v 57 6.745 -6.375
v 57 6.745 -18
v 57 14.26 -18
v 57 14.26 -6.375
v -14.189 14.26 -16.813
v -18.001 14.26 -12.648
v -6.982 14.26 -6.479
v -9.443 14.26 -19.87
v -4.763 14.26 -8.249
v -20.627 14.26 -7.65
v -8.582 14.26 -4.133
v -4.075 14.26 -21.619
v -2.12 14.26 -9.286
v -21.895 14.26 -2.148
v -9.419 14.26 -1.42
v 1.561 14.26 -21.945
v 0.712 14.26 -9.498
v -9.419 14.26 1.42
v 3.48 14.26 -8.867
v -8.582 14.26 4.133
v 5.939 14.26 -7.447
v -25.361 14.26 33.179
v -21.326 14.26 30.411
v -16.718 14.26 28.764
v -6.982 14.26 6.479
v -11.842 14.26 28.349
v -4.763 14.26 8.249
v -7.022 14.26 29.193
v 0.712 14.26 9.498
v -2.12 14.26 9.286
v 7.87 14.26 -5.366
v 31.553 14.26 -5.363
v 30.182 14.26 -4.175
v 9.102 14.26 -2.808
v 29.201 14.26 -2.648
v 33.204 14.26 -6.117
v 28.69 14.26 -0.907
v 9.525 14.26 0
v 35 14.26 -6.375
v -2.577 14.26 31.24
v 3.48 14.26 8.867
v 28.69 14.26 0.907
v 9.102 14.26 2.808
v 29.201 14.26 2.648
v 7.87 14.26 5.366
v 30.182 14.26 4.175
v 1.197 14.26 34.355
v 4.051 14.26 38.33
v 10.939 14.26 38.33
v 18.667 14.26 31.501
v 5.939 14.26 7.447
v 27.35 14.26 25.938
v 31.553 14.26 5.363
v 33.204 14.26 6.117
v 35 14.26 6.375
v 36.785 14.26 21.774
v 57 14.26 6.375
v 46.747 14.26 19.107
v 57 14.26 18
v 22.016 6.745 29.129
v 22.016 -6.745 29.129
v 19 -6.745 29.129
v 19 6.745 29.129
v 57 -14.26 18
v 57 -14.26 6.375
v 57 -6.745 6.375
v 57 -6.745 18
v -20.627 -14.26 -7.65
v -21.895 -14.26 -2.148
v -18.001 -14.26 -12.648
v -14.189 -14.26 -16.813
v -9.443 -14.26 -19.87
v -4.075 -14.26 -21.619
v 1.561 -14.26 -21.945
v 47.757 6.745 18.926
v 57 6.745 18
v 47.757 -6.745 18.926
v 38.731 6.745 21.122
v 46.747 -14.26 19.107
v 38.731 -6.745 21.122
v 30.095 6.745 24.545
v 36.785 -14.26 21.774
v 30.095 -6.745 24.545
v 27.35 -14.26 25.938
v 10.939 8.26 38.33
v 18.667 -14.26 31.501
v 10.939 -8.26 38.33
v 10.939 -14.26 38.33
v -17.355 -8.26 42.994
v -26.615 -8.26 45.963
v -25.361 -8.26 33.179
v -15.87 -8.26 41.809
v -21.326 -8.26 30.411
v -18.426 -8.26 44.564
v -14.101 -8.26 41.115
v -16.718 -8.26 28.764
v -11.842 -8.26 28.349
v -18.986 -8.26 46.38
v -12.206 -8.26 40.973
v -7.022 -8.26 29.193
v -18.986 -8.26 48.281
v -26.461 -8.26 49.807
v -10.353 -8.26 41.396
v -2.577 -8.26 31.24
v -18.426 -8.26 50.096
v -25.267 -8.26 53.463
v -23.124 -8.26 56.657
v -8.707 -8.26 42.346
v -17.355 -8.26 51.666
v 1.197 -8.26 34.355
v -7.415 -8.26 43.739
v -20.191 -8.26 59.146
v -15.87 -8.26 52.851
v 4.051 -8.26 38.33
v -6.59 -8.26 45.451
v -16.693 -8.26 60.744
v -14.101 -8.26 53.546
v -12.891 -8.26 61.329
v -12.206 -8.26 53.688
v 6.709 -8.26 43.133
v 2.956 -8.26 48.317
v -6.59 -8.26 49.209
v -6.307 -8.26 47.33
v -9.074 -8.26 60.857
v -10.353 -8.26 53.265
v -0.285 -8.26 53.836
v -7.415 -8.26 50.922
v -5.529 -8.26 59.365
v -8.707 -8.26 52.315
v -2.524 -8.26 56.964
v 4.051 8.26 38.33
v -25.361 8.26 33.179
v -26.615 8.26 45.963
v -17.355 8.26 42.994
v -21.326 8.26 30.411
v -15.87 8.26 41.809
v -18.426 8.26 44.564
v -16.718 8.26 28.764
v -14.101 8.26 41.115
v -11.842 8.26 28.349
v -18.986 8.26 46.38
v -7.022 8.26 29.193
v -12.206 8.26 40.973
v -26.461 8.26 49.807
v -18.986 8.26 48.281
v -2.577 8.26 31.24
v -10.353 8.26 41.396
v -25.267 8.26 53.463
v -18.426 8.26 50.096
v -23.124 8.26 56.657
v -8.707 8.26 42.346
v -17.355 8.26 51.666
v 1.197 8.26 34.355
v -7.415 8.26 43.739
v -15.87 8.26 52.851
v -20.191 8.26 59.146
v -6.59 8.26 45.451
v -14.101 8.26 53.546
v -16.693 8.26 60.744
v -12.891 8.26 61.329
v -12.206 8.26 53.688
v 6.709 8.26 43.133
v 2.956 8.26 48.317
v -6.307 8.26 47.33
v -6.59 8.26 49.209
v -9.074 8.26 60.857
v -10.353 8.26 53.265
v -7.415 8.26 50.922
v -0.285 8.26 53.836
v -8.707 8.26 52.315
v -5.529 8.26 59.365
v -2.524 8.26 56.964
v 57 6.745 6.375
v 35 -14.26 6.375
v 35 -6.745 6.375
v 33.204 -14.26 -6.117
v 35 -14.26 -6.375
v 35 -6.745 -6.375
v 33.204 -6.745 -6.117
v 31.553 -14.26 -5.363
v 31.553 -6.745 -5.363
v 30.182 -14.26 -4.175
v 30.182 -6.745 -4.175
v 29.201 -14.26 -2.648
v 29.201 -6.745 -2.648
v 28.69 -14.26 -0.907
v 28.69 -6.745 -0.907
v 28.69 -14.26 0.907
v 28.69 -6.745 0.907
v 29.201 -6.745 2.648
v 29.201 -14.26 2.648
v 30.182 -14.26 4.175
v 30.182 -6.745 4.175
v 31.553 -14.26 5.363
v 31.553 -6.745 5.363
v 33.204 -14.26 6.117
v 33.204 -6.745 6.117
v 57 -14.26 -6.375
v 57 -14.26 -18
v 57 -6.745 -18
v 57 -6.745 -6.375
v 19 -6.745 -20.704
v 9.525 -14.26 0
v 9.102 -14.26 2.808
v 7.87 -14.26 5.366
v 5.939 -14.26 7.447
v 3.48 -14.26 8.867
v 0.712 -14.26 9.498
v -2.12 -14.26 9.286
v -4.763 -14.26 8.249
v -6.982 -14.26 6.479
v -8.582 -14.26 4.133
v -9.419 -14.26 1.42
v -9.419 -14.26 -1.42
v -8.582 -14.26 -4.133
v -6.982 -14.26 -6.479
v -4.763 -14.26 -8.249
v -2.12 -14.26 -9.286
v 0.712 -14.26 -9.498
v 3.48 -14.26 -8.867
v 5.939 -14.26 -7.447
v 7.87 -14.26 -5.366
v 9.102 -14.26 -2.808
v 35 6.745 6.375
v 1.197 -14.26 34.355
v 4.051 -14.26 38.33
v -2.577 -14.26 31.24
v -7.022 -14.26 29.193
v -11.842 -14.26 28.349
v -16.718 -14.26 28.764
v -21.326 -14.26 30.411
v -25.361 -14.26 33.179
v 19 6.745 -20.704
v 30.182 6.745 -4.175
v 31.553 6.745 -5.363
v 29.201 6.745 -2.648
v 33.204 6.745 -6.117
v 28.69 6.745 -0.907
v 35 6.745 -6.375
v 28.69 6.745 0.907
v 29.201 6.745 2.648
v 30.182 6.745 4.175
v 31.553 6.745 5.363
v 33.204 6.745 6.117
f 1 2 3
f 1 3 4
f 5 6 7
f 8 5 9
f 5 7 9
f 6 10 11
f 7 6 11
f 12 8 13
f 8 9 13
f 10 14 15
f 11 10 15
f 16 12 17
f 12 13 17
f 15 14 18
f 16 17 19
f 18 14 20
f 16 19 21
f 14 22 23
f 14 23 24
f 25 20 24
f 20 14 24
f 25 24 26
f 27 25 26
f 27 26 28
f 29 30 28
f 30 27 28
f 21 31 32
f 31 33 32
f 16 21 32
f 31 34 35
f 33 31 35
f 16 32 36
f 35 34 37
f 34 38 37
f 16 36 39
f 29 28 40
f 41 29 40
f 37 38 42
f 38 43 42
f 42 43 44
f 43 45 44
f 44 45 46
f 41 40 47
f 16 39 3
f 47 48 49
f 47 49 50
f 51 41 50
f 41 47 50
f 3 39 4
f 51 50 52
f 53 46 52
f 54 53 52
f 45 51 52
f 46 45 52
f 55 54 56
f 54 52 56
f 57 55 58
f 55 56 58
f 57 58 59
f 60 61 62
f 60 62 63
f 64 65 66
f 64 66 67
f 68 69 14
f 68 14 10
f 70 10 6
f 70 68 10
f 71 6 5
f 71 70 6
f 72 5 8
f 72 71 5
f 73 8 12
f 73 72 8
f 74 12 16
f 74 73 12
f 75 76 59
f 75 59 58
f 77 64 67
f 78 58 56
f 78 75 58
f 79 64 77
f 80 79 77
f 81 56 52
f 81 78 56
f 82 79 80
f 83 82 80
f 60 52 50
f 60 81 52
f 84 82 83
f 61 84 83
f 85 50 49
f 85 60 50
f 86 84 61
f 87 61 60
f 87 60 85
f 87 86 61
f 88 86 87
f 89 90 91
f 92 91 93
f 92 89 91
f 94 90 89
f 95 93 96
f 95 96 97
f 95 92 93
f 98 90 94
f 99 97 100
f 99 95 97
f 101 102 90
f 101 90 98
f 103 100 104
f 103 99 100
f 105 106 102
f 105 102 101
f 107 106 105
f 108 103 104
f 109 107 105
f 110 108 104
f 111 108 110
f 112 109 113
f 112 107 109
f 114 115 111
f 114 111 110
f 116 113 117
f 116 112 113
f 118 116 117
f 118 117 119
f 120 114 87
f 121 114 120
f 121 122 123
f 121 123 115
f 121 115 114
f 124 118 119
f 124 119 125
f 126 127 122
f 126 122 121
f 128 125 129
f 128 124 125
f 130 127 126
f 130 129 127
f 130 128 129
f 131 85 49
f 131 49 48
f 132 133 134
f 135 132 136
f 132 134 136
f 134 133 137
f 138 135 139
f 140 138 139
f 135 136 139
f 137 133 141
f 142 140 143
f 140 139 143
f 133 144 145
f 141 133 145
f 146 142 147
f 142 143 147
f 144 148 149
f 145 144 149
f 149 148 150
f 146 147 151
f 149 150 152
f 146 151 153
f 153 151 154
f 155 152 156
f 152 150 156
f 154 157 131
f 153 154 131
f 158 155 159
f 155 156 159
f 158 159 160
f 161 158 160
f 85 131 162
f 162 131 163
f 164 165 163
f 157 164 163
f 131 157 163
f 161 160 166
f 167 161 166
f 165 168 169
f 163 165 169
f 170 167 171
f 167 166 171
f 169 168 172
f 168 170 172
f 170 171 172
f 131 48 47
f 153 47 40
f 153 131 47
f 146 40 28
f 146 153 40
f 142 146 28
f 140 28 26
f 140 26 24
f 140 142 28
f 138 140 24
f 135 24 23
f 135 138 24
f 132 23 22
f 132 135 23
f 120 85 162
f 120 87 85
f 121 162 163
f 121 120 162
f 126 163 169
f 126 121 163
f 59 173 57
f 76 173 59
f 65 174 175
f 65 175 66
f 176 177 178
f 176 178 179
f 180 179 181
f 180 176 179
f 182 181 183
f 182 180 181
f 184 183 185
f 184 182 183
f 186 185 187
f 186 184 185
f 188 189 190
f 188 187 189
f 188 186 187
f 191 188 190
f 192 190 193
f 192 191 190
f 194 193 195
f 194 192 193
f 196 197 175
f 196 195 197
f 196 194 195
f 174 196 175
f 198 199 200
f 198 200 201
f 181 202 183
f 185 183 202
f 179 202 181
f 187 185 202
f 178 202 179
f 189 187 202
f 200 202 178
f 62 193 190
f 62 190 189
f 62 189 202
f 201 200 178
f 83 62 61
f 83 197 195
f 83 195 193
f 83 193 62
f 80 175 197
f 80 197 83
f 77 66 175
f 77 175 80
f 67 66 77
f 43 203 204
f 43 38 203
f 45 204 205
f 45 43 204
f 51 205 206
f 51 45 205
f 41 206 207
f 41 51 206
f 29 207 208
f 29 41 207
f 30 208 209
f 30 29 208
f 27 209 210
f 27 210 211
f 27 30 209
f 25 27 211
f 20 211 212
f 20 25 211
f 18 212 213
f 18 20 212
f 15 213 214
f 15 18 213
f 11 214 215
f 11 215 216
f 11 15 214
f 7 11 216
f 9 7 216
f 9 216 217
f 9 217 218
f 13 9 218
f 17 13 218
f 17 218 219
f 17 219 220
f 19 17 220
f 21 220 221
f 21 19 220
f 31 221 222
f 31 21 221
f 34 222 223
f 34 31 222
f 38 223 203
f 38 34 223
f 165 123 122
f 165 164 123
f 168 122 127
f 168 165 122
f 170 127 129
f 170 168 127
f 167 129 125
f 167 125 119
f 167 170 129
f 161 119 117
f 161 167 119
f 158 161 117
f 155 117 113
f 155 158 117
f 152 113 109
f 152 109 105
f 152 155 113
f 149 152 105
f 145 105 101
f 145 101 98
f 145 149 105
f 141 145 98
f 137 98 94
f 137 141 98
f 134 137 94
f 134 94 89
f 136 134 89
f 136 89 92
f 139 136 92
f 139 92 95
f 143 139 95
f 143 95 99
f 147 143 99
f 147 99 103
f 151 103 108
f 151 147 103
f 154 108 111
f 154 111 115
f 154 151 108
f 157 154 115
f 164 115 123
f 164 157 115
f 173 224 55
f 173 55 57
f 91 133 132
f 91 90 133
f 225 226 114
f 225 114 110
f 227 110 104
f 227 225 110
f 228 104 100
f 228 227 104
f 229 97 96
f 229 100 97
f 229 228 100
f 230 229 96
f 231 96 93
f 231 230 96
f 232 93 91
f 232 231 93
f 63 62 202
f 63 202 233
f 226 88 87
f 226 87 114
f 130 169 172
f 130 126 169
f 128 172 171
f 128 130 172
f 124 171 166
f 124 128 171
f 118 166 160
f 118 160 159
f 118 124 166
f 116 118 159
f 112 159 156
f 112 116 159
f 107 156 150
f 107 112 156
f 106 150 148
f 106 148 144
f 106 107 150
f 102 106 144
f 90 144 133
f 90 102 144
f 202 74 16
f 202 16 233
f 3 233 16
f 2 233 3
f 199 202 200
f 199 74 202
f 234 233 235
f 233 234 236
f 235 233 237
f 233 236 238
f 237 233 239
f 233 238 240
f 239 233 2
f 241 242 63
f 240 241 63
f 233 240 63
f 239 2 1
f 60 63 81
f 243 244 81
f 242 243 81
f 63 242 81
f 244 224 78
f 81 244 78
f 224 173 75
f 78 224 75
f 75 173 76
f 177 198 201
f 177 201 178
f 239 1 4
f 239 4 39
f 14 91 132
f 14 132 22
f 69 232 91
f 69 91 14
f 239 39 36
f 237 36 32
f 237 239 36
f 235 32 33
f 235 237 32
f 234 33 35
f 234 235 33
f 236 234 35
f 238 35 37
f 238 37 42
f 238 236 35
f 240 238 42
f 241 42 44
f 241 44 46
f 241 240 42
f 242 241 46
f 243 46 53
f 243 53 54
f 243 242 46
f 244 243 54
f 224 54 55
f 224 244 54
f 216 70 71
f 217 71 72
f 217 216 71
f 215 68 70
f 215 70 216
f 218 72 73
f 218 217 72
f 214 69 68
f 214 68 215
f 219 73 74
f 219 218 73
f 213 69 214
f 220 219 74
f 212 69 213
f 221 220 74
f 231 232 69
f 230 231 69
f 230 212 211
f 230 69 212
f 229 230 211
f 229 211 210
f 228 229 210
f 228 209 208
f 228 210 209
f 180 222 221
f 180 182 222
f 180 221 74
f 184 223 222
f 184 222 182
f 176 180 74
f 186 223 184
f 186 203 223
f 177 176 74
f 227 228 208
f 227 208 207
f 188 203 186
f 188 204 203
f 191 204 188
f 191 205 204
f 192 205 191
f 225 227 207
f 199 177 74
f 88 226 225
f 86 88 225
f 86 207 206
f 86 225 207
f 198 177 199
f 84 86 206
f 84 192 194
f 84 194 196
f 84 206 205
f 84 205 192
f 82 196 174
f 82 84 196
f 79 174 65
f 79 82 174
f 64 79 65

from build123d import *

# Parameters (mm, degrees)
F0_R     = 6.375
F1_DEPTH = 8.26
F0_R_2   = 9.525
F2_DEPTH = 14.26
F3_W     = 13.49
F3_H     = 58.49083
F4_DEPTH = 38


with BuildPart() as f1:
    # F0 (on Front) → F1 (new body, symmetric)
    with BuildSketch(Plane.XZ):
        with BuildLine():
            Line((-26.615233, 45.963348), (-25.360972, 33.179498))
            ThreePointArc((-25.360972, 33.179498), (-9.404585, 28.615193), (4.051067, 38.330365))
            Line((4.051067, 38.330365), (10.939452, 38.330365))
            ThreePointArc((10.939452, 38.330365), (4.770442, 45.680142), (-0.28538, 53.835787))
            ThreePointArc((-0.28538, 53.835787), (-16.692609, 60.743646), (-26.615233, 45.963348))
        make_face()
        with Locations((-12.682133, 47.330365)):
            Circle(F0_R, mode=Mode.SUBTRACT)
    extrude(amount=F1_DEPTH, both=True)

    # F0 (on Front) → F2 (join, symmetric)
    with BuildSketch(Plane.XZ):
        with BuildLine():
            Line((-25.360972, 33.179498), (-21.894871, -2.14817))
            ThreePointArc((-21.894871, -2.14817), (-14.189314, -16.812596), (1.561379, -21.944523))
            Line((1.561379, -21.944523), (57, -18))
            Line((57, -18), (57, -6.375))
            Line((57, -6.375), (35, -6.375))
            ThreePointArc((35, -6.375), (28.625, 0), (35, 6.375))
            Line((35, 6.375), (57, 6.375))
            Line((57, 6.375), (57, 18))
            ThreePointArc((57, 18), (31.987423, 23.674071), (10.939452, 38.330365))
            Line((10.939452, 38.330365), (4.051067, 38.330365))
            ThreePointArc((4.051067, 38.330365), (-9.404585, 28.615193), (-25.360972, 33.179498))
        make_face()
        Circle(F0_R_2, mode=Mode.SUBTRACT)
    extrude(amount=F2_DEPTH, both=True)

    # F3 (on face) → F4 (cut)
    with BuildSketch(Plane.YZ.offset(57)):
        with Locations((0, -0.116389)):
            Rectangle(F3_W, F3_H)
    extrude(amount=-F4_DEPTH, mode=Mode.SUBTRACT)


solid = f1.part
